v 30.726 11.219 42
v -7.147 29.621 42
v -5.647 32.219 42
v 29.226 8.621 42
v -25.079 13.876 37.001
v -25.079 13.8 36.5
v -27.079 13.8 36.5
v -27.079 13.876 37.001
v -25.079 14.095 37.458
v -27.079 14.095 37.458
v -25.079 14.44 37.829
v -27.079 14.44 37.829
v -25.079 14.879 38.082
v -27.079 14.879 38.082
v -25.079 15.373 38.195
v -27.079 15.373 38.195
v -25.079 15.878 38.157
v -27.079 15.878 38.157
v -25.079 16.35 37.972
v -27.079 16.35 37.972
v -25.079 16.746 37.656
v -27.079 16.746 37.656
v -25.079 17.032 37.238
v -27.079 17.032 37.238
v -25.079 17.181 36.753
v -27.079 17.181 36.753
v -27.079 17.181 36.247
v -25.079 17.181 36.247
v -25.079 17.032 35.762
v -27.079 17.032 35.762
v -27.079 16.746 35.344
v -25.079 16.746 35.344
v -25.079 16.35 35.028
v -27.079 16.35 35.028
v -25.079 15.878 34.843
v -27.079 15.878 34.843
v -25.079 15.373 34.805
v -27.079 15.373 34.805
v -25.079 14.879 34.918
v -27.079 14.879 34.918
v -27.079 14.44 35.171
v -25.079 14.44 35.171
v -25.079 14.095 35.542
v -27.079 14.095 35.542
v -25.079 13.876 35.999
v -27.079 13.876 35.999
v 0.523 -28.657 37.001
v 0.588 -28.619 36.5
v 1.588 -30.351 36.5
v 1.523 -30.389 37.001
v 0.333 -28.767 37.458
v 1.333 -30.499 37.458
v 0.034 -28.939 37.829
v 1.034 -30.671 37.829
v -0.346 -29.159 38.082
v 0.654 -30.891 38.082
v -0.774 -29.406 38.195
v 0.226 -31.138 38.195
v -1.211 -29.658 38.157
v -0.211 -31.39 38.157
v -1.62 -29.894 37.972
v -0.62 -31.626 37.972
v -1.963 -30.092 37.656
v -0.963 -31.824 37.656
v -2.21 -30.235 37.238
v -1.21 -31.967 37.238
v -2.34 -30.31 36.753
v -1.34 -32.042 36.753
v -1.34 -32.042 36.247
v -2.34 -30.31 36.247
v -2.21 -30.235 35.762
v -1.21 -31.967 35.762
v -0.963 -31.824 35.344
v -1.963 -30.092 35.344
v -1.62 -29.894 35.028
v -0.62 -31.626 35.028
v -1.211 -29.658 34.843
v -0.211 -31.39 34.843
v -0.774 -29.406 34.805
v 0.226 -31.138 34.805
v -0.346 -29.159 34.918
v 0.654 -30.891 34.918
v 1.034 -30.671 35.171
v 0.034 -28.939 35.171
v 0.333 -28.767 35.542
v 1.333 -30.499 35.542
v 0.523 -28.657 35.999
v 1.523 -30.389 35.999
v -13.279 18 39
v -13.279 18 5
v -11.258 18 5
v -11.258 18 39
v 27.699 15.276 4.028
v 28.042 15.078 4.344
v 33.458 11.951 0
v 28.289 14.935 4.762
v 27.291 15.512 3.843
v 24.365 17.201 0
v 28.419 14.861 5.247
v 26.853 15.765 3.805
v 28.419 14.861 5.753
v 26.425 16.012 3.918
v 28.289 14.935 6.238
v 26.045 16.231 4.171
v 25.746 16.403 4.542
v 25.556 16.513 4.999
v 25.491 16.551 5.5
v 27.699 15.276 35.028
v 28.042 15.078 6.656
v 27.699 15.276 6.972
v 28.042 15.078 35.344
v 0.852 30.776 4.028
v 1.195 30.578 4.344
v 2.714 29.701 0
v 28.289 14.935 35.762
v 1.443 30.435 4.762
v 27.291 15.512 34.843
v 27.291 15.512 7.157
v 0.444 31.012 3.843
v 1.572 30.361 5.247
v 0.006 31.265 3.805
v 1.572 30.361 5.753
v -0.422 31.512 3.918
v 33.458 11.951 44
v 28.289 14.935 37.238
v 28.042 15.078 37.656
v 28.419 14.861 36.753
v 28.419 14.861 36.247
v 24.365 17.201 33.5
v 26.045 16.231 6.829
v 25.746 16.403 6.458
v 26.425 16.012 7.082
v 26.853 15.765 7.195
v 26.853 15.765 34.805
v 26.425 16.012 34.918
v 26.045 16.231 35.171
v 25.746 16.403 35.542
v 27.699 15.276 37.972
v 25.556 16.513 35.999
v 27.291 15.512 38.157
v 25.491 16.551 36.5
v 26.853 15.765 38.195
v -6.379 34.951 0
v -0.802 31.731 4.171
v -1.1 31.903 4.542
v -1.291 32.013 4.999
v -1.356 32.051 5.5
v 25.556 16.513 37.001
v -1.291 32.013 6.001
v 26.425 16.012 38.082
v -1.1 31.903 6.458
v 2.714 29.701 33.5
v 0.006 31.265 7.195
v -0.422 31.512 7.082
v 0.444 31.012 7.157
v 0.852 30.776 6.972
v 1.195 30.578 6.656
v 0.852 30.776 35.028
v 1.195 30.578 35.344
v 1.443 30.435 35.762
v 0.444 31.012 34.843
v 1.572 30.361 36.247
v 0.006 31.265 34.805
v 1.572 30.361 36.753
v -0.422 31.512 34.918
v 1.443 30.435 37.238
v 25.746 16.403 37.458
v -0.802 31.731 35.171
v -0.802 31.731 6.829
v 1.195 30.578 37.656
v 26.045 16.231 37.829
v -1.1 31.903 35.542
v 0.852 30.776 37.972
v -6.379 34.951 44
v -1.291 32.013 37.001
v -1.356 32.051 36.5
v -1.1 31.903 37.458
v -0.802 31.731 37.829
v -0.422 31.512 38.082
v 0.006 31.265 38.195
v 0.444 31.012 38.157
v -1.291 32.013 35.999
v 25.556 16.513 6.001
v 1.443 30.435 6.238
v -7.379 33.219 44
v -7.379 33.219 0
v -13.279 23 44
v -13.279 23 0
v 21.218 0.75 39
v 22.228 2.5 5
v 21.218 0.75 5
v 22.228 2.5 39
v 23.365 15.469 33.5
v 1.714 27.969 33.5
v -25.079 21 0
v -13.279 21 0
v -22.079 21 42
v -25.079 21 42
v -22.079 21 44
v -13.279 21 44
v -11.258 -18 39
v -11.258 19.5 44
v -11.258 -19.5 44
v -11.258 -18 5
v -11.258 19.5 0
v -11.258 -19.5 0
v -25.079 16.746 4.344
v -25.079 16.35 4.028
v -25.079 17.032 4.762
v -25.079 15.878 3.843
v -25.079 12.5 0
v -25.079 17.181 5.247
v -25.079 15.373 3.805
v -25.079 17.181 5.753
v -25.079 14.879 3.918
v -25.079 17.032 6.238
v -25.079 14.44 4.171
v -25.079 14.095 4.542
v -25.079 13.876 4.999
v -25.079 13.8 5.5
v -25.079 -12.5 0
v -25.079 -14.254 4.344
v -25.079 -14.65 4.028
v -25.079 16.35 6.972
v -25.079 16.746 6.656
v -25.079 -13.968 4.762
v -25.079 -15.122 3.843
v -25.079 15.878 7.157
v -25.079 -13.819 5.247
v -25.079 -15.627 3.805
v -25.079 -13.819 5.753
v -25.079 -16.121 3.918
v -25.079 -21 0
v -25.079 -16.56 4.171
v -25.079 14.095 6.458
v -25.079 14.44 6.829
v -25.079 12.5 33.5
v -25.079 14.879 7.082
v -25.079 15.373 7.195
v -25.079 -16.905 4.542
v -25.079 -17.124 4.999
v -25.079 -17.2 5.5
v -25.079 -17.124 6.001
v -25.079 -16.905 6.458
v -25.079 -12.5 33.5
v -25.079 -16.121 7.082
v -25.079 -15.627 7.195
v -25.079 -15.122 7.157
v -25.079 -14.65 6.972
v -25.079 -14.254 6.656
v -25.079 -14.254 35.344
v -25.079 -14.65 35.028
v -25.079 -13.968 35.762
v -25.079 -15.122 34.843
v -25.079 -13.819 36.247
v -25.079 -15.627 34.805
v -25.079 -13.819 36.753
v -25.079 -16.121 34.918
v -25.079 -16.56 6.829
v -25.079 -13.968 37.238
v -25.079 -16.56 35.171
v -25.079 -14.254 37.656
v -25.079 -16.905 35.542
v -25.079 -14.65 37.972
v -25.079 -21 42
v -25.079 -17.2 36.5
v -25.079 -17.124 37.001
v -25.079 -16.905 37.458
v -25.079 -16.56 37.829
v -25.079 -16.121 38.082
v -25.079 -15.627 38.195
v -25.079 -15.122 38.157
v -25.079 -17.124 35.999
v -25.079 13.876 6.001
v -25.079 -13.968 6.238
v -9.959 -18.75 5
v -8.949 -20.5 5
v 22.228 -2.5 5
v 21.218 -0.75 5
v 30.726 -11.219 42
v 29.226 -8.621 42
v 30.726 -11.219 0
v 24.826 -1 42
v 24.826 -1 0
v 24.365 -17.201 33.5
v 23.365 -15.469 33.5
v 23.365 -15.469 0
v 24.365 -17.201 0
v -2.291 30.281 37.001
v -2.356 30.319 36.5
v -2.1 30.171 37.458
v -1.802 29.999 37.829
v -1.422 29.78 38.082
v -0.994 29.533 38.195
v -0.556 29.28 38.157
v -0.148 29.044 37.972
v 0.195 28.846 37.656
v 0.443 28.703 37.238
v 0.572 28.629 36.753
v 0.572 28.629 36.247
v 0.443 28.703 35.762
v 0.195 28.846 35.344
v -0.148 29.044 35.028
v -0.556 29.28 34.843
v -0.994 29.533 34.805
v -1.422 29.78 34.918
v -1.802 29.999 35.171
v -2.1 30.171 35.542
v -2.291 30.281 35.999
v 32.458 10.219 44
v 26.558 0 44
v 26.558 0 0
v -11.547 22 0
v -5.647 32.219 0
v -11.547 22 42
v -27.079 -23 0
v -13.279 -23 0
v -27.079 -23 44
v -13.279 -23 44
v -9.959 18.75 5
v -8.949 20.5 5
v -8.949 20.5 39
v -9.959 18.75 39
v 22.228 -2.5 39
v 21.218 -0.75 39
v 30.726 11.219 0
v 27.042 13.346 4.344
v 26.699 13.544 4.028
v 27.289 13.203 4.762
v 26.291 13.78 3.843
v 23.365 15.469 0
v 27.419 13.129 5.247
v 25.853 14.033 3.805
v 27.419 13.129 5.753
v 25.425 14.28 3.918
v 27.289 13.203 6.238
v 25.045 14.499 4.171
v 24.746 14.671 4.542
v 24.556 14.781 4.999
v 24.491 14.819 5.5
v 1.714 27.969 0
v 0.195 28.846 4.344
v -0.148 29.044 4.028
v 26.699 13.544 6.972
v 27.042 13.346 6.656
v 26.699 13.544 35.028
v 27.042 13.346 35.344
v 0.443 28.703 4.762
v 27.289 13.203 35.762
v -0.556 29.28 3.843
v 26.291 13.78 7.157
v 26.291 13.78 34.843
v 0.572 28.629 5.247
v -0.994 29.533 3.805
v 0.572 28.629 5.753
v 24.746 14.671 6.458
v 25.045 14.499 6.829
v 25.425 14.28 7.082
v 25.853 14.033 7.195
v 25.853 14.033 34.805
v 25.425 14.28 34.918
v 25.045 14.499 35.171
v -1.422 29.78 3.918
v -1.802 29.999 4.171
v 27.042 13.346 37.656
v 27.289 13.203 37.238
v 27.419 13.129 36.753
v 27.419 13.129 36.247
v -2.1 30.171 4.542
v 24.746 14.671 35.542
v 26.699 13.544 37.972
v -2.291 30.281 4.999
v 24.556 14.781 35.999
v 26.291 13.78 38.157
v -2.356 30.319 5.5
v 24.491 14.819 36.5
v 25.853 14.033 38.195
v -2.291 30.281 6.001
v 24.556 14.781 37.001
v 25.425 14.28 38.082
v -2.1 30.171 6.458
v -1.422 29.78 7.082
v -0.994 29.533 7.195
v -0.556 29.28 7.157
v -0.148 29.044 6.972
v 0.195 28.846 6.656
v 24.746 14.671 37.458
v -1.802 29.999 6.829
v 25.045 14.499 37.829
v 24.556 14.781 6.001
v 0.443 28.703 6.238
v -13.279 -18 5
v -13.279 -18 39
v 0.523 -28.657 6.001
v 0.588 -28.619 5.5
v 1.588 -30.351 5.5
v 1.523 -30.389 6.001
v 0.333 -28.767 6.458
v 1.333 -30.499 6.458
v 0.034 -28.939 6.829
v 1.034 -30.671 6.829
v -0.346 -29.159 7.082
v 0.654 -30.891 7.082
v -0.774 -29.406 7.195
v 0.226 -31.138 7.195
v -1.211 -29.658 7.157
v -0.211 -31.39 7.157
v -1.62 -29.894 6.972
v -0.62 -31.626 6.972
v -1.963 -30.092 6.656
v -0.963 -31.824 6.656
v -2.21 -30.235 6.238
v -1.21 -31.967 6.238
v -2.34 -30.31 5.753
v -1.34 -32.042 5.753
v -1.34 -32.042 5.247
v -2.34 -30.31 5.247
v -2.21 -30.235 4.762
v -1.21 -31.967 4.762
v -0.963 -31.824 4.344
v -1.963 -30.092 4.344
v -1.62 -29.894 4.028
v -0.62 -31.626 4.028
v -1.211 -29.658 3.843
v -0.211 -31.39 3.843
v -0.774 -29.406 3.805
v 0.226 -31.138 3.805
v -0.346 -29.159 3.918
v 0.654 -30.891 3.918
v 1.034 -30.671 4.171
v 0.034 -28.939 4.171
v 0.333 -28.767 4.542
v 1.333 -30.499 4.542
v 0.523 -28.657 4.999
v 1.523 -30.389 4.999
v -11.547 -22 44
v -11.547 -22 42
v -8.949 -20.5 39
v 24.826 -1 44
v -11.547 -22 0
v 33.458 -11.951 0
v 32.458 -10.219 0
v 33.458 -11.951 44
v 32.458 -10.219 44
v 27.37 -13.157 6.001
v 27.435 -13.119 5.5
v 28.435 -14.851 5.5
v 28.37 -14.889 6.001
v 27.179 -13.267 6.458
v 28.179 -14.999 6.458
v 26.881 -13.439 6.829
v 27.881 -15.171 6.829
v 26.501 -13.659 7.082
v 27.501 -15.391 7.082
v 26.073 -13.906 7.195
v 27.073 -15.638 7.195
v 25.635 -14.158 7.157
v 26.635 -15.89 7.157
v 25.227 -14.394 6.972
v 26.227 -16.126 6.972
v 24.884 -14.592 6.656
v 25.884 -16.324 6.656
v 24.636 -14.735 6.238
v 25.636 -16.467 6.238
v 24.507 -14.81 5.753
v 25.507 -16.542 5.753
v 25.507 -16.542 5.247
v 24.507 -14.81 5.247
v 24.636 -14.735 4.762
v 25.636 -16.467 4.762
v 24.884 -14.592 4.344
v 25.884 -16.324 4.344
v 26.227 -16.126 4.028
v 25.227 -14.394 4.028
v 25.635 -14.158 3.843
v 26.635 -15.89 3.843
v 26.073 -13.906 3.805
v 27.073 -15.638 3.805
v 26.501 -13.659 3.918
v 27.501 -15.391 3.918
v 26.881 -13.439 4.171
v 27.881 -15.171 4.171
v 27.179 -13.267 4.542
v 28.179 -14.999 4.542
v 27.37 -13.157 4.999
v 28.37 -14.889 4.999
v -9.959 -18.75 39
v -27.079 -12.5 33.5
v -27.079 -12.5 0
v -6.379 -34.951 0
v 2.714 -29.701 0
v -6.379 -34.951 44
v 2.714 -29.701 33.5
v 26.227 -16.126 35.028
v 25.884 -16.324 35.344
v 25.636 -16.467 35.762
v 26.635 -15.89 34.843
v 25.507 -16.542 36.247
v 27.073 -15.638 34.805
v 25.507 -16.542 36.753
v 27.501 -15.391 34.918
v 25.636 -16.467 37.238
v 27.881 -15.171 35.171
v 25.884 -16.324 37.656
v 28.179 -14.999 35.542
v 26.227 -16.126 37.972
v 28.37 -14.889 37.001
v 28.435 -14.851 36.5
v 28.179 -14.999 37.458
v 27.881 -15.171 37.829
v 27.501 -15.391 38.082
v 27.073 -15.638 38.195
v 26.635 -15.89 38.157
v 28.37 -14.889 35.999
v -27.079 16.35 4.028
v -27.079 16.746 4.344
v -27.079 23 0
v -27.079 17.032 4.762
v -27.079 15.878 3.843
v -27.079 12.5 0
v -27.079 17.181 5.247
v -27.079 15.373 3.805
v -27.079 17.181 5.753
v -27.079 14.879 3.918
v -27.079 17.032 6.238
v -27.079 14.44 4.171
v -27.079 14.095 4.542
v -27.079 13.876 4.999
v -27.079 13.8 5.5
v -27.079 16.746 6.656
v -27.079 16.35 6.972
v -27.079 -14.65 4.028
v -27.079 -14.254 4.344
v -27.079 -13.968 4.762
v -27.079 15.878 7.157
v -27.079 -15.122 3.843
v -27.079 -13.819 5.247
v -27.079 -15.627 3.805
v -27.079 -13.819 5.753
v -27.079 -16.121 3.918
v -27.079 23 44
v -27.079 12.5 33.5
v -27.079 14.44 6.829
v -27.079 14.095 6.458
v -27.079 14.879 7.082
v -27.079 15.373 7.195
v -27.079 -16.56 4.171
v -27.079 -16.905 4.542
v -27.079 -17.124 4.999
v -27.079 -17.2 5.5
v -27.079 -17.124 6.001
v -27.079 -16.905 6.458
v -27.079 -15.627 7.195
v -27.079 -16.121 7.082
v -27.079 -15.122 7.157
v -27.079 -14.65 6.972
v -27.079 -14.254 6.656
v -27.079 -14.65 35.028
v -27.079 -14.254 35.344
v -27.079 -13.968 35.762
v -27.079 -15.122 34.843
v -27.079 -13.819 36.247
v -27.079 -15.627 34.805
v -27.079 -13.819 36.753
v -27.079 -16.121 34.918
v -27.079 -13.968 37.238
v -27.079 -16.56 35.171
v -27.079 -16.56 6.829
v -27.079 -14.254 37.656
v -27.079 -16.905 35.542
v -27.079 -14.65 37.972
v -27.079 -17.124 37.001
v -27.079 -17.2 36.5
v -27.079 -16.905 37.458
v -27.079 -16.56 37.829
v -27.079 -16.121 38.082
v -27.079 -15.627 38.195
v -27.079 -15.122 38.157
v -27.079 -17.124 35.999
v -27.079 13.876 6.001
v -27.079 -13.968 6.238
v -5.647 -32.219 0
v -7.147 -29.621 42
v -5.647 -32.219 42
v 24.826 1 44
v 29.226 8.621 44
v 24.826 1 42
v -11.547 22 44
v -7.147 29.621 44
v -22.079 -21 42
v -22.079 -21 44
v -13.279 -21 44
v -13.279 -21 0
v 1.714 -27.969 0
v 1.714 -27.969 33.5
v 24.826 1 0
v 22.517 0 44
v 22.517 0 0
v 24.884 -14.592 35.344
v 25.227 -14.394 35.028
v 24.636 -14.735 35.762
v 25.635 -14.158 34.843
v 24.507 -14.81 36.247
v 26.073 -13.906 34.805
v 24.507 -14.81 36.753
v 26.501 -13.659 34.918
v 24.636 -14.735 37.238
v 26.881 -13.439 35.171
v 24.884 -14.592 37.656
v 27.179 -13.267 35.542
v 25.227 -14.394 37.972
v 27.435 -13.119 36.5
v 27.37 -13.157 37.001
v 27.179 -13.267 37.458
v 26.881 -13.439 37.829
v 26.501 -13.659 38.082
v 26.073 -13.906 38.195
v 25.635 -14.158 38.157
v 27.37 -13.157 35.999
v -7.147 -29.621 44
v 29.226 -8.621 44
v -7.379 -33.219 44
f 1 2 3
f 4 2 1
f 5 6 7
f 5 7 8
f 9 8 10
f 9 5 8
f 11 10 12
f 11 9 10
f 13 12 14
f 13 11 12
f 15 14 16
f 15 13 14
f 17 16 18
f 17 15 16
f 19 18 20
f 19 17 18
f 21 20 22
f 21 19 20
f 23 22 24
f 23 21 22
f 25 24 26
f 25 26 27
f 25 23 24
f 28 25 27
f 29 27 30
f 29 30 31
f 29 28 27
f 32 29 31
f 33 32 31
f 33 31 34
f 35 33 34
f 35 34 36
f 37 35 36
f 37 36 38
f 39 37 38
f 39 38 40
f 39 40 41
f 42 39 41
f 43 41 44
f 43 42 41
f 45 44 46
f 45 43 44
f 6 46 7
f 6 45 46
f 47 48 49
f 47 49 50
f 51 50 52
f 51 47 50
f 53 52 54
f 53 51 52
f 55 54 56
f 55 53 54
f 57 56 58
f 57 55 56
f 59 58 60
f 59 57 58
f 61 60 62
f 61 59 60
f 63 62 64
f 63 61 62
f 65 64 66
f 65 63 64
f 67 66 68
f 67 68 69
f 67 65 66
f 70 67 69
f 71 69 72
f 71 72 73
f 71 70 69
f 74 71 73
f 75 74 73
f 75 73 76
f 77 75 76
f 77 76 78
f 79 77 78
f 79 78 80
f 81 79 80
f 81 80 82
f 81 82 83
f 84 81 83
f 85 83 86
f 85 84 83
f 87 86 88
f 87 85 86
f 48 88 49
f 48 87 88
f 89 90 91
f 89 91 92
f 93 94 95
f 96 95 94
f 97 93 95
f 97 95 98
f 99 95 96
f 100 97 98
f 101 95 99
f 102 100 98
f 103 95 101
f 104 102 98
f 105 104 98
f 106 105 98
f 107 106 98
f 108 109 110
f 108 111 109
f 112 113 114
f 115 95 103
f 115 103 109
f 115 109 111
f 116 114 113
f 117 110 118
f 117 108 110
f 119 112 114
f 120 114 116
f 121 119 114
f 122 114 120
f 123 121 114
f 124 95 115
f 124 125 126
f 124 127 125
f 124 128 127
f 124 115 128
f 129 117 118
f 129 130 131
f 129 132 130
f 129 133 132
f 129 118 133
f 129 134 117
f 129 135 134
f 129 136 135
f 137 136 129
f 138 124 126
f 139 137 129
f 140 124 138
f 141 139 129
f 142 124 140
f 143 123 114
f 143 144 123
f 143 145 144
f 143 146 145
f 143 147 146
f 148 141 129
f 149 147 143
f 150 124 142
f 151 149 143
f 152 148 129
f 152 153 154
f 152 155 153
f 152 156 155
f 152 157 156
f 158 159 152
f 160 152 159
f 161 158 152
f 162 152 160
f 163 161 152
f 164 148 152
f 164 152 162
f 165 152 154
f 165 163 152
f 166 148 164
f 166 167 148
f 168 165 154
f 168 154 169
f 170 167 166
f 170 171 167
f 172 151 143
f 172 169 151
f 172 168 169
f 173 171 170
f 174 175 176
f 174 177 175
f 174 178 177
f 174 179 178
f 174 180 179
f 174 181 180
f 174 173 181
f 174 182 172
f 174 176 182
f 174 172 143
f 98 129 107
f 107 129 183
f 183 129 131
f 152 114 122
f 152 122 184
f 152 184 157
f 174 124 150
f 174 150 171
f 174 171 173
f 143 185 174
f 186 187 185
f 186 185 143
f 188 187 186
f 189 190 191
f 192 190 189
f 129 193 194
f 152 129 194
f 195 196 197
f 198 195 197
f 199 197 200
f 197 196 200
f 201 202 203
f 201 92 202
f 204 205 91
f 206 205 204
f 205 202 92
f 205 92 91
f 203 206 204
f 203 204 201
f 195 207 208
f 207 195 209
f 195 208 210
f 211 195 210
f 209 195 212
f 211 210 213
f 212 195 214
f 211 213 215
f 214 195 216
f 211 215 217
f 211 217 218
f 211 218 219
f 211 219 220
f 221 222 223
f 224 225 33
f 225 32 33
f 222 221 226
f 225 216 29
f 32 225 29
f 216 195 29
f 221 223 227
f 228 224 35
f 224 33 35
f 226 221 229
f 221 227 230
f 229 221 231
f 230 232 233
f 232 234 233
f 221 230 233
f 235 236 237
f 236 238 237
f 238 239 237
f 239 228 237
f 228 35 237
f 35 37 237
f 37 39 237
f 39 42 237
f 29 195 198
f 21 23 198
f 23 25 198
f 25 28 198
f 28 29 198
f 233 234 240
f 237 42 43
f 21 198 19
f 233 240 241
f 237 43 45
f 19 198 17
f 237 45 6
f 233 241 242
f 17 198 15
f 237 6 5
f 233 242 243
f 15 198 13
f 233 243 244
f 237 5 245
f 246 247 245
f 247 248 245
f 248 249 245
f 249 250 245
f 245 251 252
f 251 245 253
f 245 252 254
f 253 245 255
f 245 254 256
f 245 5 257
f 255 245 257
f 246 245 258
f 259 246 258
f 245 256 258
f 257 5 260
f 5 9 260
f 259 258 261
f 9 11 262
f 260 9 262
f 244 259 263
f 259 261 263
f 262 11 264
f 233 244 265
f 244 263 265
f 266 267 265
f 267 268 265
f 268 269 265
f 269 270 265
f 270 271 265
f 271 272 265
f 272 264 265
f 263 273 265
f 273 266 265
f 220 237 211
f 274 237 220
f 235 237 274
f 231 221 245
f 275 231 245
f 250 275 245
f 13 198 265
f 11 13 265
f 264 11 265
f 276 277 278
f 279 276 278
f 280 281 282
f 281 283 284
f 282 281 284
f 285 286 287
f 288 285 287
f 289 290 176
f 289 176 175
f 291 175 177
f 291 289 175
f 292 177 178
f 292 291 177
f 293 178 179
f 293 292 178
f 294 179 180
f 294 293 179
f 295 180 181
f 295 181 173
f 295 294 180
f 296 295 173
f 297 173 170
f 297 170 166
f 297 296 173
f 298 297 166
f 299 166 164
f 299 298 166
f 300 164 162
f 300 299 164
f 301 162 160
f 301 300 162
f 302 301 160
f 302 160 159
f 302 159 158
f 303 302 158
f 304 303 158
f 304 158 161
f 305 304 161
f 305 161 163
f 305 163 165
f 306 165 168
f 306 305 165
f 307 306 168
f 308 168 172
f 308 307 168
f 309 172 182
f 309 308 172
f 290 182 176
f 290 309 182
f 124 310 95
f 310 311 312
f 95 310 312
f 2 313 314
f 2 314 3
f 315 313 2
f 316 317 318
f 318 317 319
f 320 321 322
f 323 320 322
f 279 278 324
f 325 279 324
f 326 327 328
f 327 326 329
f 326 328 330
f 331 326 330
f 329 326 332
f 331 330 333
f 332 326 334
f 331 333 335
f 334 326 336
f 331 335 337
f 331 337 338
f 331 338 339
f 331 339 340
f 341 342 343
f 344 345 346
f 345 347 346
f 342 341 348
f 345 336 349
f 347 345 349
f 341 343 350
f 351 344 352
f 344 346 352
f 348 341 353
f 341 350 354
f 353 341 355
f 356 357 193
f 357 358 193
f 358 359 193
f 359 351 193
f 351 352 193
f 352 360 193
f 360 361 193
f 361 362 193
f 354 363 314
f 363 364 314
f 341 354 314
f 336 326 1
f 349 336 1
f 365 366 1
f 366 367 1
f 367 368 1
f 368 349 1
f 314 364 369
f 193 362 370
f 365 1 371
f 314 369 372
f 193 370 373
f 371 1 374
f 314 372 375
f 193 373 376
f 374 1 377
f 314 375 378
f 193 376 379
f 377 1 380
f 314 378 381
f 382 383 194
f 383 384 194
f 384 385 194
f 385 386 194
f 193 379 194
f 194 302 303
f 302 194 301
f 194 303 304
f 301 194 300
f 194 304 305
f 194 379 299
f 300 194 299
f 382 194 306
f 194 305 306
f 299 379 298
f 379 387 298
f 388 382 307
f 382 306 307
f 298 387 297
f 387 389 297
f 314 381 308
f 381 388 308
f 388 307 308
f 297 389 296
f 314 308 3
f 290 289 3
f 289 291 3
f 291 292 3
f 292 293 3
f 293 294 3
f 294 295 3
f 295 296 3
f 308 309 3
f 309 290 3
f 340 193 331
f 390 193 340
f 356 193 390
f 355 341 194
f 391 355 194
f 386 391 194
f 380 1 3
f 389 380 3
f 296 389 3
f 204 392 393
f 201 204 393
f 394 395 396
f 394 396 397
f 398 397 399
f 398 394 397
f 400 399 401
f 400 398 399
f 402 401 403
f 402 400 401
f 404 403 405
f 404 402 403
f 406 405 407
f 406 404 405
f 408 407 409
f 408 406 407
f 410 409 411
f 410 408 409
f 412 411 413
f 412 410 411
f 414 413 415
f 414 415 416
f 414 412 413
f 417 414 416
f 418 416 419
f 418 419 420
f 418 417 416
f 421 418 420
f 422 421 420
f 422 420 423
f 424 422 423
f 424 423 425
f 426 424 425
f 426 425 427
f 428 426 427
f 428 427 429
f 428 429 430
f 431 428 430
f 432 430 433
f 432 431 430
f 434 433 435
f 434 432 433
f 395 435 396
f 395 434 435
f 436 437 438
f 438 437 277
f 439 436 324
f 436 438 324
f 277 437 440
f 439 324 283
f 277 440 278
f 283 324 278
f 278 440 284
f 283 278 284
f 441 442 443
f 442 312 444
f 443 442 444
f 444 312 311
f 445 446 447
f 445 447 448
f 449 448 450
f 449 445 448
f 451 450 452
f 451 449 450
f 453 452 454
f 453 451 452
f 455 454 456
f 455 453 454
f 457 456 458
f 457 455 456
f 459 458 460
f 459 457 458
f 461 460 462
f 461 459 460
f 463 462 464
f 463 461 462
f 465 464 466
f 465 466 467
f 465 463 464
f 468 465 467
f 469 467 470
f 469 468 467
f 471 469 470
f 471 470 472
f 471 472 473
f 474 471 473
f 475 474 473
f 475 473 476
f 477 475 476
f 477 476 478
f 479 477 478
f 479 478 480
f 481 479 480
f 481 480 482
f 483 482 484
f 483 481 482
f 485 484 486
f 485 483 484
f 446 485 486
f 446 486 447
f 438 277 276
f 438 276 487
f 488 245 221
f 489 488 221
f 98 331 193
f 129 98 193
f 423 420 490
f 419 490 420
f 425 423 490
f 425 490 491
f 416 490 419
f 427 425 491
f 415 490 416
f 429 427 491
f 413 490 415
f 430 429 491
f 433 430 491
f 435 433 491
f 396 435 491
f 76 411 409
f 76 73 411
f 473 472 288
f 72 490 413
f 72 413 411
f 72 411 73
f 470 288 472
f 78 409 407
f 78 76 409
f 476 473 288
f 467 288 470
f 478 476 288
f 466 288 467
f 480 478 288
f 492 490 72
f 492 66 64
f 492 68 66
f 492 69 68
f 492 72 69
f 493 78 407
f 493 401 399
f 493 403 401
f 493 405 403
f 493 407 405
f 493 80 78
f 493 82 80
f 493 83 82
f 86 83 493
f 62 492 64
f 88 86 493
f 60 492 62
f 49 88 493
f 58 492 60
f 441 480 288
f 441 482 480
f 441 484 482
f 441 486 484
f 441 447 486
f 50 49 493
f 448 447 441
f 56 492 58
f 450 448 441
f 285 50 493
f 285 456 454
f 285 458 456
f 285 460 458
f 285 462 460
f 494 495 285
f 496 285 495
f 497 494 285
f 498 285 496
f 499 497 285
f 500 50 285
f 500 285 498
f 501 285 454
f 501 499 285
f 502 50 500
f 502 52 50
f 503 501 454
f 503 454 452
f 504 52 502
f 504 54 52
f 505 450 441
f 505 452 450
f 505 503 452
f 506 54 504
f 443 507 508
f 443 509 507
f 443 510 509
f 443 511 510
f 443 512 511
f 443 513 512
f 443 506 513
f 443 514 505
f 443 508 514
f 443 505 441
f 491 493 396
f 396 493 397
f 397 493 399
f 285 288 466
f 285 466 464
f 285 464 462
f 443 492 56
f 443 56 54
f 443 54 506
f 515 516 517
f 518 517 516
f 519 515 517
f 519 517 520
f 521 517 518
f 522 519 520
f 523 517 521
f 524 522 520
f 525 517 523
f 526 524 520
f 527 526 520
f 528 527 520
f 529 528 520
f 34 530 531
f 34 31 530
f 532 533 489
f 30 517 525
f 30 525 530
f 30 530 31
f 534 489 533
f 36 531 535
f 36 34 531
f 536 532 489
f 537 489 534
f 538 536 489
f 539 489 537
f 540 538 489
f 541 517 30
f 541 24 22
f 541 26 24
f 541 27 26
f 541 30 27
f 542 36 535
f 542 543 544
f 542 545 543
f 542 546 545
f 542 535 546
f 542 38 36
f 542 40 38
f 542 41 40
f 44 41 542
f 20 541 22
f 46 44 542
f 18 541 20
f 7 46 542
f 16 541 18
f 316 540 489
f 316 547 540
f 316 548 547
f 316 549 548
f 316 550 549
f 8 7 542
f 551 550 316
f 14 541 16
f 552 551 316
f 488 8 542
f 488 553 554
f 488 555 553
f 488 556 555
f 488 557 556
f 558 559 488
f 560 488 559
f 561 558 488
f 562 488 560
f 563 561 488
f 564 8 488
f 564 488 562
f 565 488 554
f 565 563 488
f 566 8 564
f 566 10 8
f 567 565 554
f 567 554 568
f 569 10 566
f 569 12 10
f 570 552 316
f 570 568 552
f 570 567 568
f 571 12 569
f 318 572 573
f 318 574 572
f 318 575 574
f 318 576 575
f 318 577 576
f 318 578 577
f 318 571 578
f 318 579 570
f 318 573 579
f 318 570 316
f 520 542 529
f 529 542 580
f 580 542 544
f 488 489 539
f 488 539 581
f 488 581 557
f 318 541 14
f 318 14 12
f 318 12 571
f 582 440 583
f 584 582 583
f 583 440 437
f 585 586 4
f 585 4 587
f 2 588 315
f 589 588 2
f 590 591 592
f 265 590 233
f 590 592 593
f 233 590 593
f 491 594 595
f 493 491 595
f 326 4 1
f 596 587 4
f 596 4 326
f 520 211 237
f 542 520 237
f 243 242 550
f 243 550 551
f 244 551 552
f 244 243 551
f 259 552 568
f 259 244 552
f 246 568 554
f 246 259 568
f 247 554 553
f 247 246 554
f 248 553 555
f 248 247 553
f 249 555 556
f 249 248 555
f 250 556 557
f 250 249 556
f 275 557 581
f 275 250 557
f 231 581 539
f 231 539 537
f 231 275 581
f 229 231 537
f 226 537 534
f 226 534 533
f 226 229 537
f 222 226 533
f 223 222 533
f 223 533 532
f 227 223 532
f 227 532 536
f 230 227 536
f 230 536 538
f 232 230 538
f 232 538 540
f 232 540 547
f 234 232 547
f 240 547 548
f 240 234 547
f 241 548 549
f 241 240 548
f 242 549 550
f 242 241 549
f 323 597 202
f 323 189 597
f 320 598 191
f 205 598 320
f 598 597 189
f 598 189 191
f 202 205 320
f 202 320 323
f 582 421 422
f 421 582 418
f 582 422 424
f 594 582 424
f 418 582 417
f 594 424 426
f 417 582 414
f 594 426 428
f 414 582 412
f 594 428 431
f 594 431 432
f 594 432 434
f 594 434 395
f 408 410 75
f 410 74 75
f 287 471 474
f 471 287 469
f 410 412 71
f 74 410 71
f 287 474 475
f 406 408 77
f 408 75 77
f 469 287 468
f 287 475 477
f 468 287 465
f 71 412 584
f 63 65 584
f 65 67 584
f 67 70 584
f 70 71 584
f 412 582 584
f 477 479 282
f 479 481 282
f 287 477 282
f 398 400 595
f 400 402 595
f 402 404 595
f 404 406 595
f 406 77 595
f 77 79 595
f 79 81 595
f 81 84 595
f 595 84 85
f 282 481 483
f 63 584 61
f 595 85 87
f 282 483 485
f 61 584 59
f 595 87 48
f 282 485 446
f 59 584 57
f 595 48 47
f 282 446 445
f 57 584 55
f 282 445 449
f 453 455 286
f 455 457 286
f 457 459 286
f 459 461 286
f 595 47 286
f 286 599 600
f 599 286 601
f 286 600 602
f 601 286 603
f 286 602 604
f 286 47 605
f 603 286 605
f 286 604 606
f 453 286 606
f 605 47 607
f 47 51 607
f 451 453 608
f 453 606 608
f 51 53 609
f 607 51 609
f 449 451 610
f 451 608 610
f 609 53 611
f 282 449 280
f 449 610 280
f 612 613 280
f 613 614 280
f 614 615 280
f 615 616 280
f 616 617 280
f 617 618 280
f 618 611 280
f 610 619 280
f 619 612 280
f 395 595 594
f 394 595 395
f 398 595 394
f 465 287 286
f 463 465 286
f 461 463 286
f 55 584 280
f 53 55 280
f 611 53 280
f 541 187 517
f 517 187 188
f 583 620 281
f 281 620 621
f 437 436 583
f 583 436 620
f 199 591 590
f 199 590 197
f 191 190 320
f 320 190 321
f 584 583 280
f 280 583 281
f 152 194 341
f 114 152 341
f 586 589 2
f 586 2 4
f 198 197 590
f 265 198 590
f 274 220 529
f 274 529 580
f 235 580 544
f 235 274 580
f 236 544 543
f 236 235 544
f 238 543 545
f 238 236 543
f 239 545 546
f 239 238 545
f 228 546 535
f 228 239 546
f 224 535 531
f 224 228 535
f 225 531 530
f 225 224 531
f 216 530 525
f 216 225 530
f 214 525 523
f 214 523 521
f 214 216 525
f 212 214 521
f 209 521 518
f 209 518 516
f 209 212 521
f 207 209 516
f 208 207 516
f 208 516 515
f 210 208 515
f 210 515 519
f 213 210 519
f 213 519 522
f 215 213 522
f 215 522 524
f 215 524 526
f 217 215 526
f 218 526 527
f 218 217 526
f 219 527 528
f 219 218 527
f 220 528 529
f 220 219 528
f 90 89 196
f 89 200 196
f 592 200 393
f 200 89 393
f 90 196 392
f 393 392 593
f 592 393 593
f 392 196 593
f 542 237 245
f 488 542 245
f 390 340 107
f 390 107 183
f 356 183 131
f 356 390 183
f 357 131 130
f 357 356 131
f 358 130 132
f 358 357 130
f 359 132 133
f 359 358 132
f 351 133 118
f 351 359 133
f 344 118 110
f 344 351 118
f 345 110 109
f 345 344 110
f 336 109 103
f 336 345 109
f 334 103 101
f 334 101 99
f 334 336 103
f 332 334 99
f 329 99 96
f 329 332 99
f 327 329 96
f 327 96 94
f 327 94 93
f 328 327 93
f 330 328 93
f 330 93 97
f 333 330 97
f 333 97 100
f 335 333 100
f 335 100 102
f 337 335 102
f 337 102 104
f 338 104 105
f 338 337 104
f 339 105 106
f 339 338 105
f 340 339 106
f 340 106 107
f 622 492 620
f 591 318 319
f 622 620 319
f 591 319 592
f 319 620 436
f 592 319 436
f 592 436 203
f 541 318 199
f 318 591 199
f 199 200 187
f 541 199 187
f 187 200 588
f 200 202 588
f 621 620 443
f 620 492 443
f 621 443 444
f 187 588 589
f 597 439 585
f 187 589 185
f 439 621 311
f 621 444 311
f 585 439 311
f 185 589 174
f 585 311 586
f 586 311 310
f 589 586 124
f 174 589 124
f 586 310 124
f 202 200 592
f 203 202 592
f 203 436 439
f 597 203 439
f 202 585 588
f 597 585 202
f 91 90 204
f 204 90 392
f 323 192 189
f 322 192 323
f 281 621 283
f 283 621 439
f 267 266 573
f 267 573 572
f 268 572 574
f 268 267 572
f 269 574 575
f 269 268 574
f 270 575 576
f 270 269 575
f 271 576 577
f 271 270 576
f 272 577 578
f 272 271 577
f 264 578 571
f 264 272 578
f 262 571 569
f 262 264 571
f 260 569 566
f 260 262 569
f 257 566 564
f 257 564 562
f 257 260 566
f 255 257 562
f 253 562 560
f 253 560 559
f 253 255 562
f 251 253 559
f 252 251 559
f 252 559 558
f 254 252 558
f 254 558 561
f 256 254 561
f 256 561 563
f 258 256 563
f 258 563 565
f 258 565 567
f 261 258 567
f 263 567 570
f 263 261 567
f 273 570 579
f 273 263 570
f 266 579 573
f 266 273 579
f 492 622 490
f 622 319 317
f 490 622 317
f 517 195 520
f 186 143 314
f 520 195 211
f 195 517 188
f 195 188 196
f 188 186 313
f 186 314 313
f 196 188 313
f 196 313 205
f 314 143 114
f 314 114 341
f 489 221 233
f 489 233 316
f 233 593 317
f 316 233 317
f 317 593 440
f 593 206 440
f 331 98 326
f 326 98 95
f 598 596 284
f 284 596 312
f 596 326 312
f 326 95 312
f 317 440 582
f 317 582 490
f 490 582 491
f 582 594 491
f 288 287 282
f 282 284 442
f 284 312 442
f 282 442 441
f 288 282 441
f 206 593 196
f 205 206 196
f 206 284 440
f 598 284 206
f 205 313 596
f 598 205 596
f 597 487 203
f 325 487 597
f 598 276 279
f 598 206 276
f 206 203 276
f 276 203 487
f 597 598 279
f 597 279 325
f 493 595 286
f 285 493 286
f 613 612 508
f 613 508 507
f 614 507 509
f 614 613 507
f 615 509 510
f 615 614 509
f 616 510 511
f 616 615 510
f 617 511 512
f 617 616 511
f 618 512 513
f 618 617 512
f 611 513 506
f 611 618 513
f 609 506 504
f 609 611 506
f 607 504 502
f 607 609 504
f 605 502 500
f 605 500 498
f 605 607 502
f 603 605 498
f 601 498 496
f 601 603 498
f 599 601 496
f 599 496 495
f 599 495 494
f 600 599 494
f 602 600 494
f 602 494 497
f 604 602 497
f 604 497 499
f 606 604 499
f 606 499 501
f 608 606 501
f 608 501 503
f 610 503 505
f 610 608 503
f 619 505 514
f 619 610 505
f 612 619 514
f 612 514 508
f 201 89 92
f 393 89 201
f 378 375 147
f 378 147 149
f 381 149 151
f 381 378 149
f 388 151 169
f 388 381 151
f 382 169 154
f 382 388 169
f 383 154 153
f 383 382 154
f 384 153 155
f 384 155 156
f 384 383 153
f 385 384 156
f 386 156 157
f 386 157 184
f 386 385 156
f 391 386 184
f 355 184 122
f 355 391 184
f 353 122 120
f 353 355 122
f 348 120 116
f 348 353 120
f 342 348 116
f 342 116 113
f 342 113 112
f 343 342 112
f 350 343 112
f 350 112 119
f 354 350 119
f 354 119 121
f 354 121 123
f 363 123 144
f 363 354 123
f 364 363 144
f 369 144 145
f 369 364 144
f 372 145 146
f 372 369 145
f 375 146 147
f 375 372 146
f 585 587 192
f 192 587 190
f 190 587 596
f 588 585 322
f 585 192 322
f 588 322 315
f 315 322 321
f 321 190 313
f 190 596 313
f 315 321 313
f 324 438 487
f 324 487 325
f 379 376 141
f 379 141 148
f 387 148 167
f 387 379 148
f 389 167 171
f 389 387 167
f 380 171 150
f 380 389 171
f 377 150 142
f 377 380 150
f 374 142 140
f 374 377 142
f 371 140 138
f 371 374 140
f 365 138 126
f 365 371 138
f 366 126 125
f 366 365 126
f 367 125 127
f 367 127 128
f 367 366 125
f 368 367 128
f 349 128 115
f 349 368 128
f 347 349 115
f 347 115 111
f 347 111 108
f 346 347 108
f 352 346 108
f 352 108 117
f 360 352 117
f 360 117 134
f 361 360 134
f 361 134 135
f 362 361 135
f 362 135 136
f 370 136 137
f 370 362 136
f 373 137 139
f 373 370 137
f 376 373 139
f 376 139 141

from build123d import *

# Parameters (mm, degrees)
PAD_DEPTH       = 44
PAD001_DEPTH    = 11.8
SKETCH002_R     = 1.7
PAD002_DEPTH    = 2
POCKET_DEPTH    = 5
SKETCH004_W     = 36
SKETCH004_H     = 34
POCKET001_DEPTH = 3
SKETCH005_W     = 36
SKETCH005_H     = 34
POCKET002_DEPTH = 4
PAD003_DEPTH    = 11.8
SKETCH007_R     = 1.7
PAD004_DEPTH    = 2
POCKET003_DEPTH = 2
PAD005_DEPTH    = 11.8
SKETCH010_R     = 1.7
PAD006_DEPTH    = 2
SKETCH011_W     = 8.8
SKETCH011_H     = 42
POCKET004_DEPTH = 2
SKETCH012_W     = 36
SKETCH012_H     = 34
POCKET005_DEPTH = 3


with BuildPart() as part:
    # Sketch → Pad (new body)
    with BuildSketch(Plane.XY):
        Polygon((26.5581123827, 0), (-13.2790561914, 23), (-13.2790561914, -23), align=None)
        Polygon((22.5166604984, 0), (-11.2583302492, 19.5), (-11.2583302492, -19.5), align=None, mode=Mode.SUBTRACT)
    extrude(amount=PAD_DEPTH)

    # Sketch001 (on Face3 of Pad) → Pad001 (join)
    with BuildSketch(Plane(origin=(6.6395280957, -11.5, 0), x_dir=(0.8660254038, 0.5, 0), z_dir=(0.5, -0.8660254038, 0))):
        Polygon((-23, 0), (-21, 0), (-21, 42), (21, 42), (21, 0), (23, 0), (23, 44), (-23, 44), align=None)
    extrude(amount=PAD001_DEPTH)

    # Sketch002 (on Face8 of Pad001) → Pad002 (join)
    with BuildSketch(Plane(origin=(12.5395280957, -21.7190997647, 0), x_dir=(0.8660254038, 0.5, 0), z_dir=(0.5, -0.8660254038, 0))):
        Polygon((-23, 0), (-12.5, 0), (-12.5, 33.5), (12.5, 33.5), (12.5, 0), (23, 0), (23, 44), (-23, 44), align=None)
        with Locations((-15.5, 36.5)):
            Circle(SKETCH002_R, mode=Mode.SUBTRACT)
        with Locations((-15.5, 5.5)):
            Circle(SKETCH002_R, mode=Mode.SUBTRACT)
        with Locations((15.5, 5.5)):
            Circle(SKETCH002_R, mode=Mode.SUBTRACT)
        with Locations((15.5, 36.5)):
            Circle(SKETCH002_R, mode=Mode.SUBTRACT)
    extrude(amount=PAD002_DEPTH)

    # Sketch003 (on Face7 of Pad002) → Pocket (cut)
    with BuildSketch(Plane.XY.offset(44)):
        Polygon((-11.5470053838, -22), (-7.1470053838, -29.6210235533), (29.2260615752, -8.6210235533), (24.8260615752, -1), align=None)
    extrude(amount=-POCKET_DEPTH, mode=Mode.SUBTRACT)

    # Sketch004 (on Face11 of Pocket) → Pocket001 (cut)
    with BuildSketch(Plane(origin=(6.6395280957, -11.5, 0), x_dir=(0.8660254038, 0.5, 0), z_dir=(0.5, -0.8660254038, 0))):
        with Locations((0, 22)):
            Rectangle(SKETCH004_W, SKETCH004_H)
    extrude(amount=-POCKET001_DEPTH, mode=Mode.SUBTRACT)

    # Sketch005 (on Face1 of Pocket001) → Pocket002 (cut)
    with BuildSketch(Plane(origin=(6.6395280957, 11.5, 0), x_dir=(-0.8660254038, 0.5, 0), z_dir=(0.5, 0.8660254038, 0))):
        with Locations((0, 22)):
            Rectangle(SKETCH005_W, SKETCH005_H)
    extrude(amount=-POCKET002_DEPTH, mode=Mode.SUBTRACT)

    # Sketch006 (on Face1 of Pocket002) → Pad003 (join)
    with BuildSketch(Plane(origin=(6.6395280957, 11.5, 0), x_dir=(-0.8660254038, 0.5, 0), z_dir=(0.5, 0.8660254038, 0))):
        Polygon((-23, 44), (23, 44), (23, 0), (21, 0), (21, 42), (-21, 42), (-21, 0), (-23, 0), align=None)
    extrude(amount=PAD003_DEPTH)

    # Sketch007 (on Face19 of Pad003) → Pad004 (join)
    with BuildSketch(Plane(origin=(12.5395280957, 21.7190997647, 0), x_dir=(-0.8660254038, 0.5, 0), z_dir=(0.5, 0.8660254038, 0))):
        Polygon((-23, 0), (-12.5, 0), (-12.5, 33.5), (12.5, 33.5), (12.5, 0), (23, 0), (23, 44), (-23, 44), align=None)
        with Locations((-15.5, 36.5)):
            Circle(SKETCH007_R, mode=Mode.SUBTRACT)
        with Locations((15.5, 36.5)):
            Circle(SKETCH007_R, mode=Mode.SUBTRACT)
        with Locations((15.5, 5.5)):
            Circle(SKETCH007_R, mode=Mode.SUBTRACT)
        with Locations((-15.5, 5.5)):
            Circle(SKETCH007_R, mode=Mode.SUBTRACT)
    extrude(amount=PAD004_DEPTH)

    # Sketch008 (on Face43 of Pad004) → Pocket003 (cut)
    with BuildSketch(Plane.XY.offset(44)):
        Polygon((-11.5470053838, 22), (-7.1470053838, 29.6210235533), (29.2260615751, 8.6210235533), (24.8260615752, 1), align=None)
    extrude(amount=-POCKET003_DEPTH, mode=Mode.SUBTRACT)

    # Sketch009 (on Face12 of Pocket003) → Pad005 (join)
    with BuildSketch(Plane(origin=(-13.2790561914, 0, 0), x_dir=(0, -1, 0), z_dir=(-1, 0, 0))):
        Polygon((-23, 0), (-21, 0), (-21, 42), (21, 42), (21, 0), (23, 0), (23, 44), (-23, 44), align=None)
    extrude(amount=PAD005_DEPTH)

    # Sketch010 (on Face32 of Pad005) → Pad006 (join)
    with BuildSketch(Plane(origin=(-25.0790561914, 0, 0), x_dir=(0, -1, 0), z_dir=(-1, 0, 0))):
        Polygon((-23, 0), (-12.5, 0), (-12.5, 33.5), (12.5, 33.5), (12.5, 0), (23, 0), (23, 44), (-23, 44), align=None)
        with Locations((-15.5, 5.5)):
            Circle(SKETCH010_R, mode=Mode.SUBTRACT)
        with Locations((-15.5, 36.5)):
            Circle(SKETCH010_R, mode=Mode.SUBTRACT)
        with Locations((15.5, 36.5)):
            Circle(SKETCH010_R, mode=Mode.SUBTRACT)
        with Locations((15.5, 5.5)):
            Circle(SKETCH010_R, mode=Mode.SUBTRACT)
    extrude(amount=PAD006_DEPTH)

    # Sketch011 (on Face57 of Pad006) → Pocket004 (cut)
    with BuildSketch(Plane.XY.offset(44)):
        with Locations((-17.6790561914, 0)):
            Rectangle(SKETCH011_W, SKETCH011_H)
    extrude(amount=-POCKET004_DEPTH, mode=Mode.SUBTRACT)

    # Sketch012 (on Face13 of Pocket004) → Pocket005 (cut)
    with BuildSketch(Plane(origin=(-13.2790561914, 0, 0), x_dir=(0, -1, 0), z_dir=(-1, 0, 0))):
        with Locations((0, 22)):
            Rectangle(SKETCH012_W, SKETCH012_H)
    extrude(amount=-POCKET005_DEPTH, mode=Mode.SUBTRACT)


solid = part.part
